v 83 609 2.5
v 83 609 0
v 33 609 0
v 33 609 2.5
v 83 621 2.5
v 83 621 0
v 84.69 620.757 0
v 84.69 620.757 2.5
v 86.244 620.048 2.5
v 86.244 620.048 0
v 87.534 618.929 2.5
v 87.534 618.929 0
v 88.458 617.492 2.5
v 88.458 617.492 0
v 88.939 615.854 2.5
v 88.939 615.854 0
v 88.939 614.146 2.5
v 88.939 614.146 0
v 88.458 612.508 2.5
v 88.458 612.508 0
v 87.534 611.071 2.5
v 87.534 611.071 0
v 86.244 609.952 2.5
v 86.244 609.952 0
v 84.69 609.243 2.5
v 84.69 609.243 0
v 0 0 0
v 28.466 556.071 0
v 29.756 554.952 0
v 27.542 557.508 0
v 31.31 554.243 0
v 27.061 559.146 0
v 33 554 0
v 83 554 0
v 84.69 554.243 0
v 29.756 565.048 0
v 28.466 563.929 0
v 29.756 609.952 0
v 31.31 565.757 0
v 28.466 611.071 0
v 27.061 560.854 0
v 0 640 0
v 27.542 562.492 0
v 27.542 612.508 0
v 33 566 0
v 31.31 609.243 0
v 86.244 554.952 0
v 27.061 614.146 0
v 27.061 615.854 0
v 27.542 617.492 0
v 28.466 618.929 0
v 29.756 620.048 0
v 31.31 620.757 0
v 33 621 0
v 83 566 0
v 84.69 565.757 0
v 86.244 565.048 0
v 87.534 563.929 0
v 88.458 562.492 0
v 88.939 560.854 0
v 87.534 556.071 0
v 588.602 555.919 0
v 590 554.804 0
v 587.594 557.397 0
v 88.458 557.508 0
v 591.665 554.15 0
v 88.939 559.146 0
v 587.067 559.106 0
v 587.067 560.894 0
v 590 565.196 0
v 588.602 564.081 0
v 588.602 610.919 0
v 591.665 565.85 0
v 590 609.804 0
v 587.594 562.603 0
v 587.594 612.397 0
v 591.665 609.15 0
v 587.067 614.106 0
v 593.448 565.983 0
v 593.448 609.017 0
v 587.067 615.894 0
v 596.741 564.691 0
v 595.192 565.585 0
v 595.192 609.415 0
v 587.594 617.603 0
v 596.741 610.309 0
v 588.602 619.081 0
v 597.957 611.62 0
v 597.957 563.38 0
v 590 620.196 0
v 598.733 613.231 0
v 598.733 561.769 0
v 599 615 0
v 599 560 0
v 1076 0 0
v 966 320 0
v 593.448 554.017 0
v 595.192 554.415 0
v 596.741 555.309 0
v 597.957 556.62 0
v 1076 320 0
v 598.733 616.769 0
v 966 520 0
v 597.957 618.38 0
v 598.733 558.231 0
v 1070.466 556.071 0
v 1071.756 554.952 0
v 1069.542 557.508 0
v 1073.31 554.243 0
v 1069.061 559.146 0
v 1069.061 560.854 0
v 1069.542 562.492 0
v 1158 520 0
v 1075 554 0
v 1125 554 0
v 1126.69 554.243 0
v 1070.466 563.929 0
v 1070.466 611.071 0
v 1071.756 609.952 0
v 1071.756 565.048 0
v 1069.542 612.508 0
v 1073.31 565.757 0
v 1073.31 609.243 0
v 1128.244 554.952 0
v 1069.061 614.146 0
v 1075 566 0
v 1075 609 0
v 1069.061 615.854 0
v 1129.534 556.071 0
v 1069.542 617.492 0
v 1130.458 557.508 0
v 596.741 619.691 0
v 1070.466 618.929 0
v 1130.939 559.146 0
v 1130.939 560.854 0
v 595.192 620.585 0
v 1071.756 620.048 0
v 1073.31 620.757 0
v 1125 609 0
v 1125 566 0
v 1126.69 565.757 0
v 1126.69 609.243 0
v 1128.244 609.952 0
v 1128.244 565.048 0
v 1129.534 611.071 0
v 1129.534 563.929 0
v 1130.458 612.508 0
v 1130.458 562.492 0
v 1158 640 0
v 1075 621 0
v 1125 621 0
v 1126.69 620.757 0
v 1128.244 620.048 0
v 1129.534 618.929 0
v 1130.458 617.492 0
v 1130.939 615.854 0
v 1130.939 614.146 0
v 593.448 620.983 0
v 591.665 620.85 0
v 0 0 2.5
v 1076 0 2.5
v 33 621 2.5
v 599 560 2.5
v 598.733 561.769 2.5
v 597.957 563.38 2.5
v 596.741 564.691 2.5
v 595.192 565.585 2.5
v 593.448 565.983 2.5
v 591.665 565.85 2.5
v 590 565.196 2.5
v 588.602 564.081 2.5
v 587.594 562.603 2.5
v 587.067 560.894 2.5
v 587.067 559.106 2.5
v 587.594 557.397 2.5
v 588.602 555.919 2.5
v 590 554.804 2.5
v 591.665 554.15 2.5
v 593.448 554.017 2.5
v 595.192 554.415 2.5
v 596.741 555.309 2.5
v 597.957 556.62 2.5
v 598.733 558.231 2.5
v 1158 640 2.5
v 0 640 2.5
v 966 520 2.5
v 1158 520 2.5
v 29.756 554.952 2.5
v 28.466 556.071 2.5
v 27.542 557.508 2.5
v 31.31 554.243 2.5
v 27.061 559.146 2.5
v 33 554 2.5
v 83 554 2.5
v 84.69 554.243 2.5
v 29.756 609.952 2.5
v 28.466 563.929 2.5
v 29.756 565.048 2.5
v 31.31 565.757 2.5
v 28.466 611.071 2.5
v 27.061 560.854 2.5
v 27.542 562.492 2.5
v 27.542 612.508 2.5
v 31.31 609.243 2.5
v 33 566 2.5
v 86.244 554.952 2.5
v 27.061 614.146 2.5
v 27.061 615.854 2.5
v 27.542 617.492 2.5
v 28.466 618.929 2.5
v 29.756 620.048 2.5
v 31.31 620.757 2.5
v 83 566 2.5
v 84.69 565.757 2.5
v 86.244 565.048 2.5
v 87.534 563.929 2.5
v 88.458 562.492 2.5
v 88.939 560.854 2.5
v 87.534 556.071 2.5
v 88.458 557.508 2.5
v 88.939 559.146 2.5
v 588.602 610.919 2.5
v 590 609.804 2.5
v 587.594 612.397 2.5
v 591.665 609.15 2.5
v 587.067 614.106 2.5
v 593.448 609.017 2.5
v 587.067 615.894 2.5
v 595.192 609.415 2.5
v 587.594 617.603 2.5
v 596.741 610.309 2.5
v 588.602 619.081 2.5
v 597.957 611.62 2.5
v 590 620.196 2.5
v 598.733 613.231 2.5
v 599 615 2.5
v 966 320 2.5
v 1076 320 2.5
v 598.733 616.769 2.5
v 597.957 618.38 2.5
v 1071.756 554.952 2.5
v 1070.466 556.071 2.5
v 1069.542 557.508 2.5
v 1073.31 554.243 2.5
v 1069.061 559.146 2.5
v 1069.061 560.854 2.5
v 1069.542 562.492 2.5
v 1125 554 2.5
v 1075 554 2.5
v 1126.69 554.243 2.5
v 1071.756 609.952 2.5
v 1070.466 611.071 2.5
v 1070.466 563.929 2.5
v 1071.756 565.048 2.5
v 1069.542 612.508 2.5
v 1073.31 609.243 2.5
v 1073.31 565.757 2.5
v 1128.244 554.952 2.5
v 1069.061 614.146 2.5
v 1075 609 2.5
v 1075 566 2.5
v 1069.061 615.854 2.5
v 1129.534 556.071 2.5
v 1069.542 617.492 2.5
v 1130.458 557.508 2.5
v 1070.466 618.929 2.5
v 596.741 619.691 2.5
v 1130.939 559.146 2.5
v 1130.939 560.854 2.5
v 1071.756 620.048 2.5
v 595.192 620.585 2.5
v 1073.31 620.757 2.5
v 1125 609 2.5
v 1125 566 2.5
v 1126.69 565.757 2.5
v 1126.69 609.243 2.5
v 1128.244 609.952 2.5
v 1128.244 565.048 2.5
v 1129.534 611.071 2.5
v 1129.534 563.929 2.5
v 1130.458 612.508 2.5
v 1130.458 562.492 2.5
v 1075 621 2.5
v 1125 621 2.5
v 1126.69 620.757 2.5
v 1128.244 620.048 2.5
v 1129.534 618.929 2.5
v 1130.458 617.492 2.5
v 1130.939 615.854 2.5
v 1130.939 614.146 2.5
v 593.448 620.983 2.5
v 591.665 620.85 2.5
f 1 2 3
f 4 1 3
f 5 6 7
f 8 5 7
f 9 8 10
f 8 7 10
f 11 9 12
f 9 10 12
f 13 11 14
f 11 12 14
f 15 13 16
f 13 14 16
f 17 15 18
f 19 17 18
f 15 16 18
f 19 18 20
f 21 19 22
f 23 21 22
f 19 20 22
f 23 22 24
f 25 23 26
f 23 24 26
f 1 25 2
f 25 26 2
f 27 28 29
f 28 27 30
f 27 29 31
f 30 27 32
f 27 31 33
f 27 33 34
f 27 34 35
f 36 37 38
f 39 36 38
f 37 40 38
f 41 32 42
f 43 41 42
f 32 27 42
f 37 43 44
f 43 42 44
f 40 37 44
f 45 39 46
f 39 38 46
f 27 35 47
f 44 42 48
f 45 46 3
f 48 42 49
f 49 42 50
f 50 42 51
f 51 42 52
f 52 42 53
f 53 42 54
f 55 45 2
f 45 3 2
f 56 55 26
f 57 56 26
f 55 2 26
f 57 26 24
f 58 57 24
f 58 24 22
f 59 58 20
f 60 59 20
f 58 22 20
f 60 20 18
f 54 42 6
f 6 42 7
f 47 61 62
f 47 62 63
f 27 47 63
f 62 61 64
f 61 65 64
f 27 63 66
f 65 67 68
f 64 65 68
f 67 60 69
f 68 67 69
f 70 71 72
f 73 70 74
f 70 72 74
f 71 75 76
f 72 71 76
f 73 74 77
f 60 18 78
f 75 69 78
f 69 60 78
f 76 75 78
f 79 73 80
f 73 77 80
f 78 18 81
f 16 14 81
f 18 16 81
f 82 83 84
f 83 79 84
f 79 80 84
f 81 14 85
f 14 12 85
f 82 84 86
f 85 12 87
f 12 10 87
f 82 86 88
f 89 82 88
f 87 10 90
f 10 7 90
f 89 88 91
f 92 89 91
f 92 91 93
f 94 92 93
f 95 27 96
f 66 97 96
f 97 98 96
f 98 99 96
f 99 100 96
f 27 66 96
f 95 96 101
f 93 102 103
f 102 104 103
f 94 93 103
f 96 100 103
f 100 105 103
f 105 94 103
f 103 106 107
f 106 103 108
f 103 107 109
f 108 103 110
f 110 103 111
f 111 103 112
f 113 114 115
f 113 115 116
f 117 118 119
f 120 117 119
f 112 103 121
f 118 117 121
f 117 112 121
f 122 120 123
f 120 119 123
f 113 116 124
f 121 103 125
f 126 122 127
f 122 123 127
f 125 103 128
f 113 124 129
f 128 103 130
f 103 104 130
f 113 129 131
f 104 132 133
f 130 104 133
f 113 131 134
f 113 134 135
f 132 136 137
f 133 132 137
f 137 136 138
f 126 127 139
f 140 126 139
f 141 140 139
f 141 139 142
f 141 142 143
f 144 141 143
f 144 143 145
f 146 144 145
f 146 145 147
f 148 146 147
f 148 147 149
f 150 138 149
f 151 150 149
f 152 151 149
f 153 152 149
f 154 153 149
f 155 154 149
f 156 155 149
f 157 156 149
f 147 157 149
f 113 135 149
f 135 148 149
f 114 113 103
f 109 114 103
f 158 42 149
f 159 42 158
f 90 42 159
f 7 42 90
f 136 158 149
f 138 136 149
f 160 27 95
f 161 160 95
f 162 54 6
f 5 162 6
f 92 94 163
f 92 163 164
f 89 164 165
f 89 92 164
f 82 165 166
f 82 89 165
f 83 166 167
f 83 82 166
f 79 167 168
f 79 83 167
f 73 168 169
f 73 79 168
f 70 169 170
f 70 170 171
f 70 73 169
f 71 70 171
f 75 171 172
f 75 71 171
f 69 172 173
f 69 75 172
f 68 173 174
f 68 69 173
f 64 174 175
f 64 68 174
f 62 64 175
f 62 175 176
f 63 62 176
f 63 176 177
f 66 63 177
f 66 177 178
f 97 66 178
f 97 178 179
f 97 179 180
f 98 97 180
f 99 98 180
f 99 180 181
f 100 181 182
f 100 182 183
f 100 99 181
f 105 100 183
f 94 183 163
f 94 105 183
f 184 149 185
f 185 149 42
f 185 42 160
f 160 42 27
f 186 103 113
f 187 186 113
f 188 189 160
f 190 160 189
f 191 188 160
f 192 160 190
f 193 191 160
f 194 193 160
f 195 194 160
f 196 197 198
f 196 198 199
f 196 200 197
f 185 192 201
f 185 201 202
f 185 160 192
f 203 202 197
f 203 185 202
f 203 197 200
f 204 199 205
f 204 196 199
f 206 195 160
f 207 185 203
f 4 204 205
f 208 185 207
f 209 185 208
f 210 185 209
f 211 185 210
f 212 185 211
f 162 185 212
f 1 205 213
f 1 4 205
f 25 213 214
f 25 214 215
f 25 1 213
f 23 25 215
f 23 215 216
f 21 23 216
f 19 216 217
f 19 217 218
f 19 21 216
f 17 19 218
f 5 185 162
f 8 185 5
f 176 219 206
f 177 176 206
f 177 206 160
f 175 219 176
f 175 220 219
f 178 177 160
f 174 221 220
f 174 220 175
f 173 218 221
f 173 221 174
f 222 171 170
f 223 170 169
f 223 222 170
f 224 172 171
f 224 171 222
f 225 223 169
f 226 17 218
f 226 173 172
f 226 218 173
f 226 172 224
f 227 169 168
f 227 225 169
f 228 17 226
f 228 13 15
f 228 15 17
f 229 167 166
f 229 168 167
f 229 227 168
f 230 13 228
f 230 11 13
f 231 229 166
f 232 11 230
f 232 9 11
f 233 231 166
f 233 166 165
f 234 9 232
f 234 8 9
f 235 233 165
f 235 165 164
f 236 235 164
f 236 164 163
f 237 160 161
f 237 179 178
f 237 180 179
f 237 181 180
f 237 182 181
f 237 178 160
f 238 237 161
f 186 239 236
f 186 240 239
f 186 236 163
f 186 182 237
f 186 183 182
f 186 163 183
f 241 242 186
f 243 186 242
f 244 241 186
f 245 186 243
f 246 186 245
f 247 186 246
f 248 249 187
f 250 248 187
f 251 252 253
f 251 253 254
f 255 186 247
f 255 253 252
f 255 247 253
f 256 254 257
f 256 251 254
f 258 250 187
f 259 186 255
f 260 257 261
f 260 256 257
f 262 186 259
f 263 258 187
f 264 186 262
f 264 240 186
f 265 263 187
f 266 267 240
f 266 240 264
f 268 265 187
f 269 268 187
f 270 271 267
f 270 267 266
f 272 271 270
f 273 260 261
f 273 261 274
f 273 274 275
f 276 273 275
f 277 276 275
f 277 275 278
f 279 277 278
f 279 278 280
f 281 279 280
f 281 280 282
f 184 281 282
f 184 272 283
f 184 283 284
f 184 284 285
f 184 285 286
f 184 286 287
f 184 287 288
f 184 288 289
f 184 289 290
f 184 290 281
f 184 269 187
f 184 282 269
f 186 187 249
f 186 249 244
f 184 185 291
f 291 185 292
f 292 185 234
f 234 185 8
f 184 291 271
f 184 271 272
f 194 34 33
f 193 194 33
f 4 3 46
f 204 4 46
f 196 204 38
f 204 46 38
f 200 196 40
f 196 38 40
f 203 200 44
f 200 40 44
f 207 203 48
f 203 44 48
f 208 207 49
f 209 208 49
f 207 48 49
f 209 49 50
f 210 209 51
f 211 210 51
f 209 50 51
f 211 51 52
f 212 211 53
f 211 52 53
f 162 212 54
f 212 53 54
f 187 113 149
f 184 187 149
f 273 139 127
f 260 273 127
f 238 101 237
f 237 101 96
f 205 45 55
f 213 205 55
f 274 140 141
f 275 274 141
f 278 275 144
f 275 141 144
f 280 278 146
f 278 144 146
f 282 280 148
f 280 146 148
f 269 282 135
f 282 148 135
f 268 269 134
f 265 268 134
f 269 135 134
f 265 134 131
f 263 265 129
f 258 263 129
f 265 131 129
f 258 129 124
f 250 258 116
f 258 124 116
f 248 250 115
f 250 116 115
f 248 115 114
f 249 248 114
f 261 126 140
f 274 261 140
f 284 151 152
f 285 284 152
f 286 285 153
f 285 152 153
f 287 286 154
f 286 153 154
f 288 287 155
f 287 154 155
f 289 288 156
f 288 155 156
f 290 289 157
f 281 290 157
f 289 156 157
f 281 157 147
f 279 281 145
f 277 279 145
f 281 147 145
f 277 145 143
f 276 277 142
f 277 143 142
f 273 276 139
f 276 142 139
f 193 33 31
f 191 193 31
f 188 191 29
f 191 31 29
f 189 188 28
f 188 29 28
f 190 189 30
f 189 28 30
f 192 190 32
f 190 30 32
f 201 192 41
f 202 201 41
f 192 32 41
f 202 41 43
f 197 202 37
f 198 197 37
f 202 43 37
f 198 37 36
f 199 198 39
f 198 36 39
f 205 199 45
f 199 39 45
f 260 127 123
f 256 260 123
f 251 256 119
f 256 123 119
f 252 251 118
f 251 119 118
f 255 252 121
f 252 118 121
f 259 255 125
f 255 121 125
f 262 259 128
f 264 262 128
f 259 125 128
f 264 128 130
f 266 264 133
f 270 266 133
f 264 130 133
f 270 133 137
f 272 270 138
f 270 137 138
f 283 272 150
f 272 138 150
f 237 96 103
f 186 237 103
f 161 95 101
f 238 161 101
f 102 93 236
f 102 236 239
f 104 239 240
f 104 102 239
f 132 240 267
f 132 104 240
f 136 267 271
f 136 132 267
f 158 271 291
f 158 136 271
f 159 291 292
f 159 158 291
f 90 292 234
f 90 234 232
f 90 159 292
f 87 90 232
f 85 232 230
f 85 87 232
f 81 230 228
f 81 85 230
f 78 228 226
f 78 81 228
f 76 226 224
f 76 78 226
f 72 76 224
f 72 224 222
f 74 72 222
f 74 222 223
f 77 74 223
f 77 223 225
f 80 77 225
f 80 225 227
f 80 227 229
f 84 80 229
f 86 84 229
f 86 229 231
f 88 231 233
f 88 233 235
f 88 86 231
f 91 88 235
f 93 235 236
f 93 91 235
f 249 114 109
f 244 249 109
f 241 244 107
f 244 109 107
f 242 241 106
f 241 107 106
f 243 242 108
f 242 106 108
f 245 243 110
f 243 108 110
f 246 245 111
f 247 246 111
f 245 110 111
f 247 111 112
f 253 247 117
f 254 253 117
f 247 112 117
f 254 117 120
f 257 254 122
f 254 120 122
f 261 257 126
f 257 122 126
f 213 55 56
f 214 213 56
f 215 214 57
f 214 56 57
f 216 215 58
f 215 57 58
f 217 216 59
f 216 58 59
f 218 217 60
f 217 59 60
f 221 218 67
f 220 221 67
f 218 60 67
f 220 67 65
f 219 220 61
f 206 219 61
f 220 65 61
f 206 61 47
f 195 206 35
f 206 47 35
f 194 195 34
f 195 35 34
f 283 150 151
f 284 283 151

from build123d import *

# Parameters (mm, degrees)
F0_R     = 6
F1_DEPTH = 2.5


with BuildPart() as f1:
    # F0 (on Top) → F1 (new body)
    with BuildSketch(Plane.XY):
        Polygon((0, 640), (0, 0), (1076, 0), (1076, 320), (966, 320), (966, 520), (1158, 520), (1158, 640), align=None)
        with BuildLine():
            ThreePointArc((33, 554), (27, 560), (33, 566))
            Line((33, 566), (83, 566))
            ThreePointArc((83, 566), (89, 560), (83, 554))
            Line((83, 554), (33, 554))
        make_face(mode=Mode.SUBTRACT)
        with BuildLine():
            ThreePointArc((33, 609), (27, 615), (33, 621))
            Line((33, 621), (83, 621))
            ThreePointArc((83, 621), (89, 615), (83, 609))
            Line((83, 609), (33, 609))
        make_face(mode=Mode.SUBTRACT)
        with Locations((593, 560)):
            Circle(F0_R, mode=Mode.SUBTRACT)
        with Locations((593, 615)):
            Circle(F0_R, mode=Mode.SUBTRACT)
        with BuildLine():
            ThreePointArc((1075, 554), (1069, 560), (1075, 566))
            Line((1075, 566), (1125, 566))
            ThreePointArc((1125, 566), (1131, 560), (1125, 554))
            Line((1125, 554), (1075, 554))
        make_face(mode=Mode.SUBTRACT)
        with BuildLine():
            ThreePointArc((1075, 609), (1069, 615), (1075, 621))
            Line((1075, 621), (1125, 621))
            ThreePointArc((1125, 621), (1131, 615), (1125, 609))
            Line((1125, 609), (1075, 609))
        make_face(mode=Mode.SUBTRACT)
    extrude(amount=F1_DEPTH)


solid = f1.part
